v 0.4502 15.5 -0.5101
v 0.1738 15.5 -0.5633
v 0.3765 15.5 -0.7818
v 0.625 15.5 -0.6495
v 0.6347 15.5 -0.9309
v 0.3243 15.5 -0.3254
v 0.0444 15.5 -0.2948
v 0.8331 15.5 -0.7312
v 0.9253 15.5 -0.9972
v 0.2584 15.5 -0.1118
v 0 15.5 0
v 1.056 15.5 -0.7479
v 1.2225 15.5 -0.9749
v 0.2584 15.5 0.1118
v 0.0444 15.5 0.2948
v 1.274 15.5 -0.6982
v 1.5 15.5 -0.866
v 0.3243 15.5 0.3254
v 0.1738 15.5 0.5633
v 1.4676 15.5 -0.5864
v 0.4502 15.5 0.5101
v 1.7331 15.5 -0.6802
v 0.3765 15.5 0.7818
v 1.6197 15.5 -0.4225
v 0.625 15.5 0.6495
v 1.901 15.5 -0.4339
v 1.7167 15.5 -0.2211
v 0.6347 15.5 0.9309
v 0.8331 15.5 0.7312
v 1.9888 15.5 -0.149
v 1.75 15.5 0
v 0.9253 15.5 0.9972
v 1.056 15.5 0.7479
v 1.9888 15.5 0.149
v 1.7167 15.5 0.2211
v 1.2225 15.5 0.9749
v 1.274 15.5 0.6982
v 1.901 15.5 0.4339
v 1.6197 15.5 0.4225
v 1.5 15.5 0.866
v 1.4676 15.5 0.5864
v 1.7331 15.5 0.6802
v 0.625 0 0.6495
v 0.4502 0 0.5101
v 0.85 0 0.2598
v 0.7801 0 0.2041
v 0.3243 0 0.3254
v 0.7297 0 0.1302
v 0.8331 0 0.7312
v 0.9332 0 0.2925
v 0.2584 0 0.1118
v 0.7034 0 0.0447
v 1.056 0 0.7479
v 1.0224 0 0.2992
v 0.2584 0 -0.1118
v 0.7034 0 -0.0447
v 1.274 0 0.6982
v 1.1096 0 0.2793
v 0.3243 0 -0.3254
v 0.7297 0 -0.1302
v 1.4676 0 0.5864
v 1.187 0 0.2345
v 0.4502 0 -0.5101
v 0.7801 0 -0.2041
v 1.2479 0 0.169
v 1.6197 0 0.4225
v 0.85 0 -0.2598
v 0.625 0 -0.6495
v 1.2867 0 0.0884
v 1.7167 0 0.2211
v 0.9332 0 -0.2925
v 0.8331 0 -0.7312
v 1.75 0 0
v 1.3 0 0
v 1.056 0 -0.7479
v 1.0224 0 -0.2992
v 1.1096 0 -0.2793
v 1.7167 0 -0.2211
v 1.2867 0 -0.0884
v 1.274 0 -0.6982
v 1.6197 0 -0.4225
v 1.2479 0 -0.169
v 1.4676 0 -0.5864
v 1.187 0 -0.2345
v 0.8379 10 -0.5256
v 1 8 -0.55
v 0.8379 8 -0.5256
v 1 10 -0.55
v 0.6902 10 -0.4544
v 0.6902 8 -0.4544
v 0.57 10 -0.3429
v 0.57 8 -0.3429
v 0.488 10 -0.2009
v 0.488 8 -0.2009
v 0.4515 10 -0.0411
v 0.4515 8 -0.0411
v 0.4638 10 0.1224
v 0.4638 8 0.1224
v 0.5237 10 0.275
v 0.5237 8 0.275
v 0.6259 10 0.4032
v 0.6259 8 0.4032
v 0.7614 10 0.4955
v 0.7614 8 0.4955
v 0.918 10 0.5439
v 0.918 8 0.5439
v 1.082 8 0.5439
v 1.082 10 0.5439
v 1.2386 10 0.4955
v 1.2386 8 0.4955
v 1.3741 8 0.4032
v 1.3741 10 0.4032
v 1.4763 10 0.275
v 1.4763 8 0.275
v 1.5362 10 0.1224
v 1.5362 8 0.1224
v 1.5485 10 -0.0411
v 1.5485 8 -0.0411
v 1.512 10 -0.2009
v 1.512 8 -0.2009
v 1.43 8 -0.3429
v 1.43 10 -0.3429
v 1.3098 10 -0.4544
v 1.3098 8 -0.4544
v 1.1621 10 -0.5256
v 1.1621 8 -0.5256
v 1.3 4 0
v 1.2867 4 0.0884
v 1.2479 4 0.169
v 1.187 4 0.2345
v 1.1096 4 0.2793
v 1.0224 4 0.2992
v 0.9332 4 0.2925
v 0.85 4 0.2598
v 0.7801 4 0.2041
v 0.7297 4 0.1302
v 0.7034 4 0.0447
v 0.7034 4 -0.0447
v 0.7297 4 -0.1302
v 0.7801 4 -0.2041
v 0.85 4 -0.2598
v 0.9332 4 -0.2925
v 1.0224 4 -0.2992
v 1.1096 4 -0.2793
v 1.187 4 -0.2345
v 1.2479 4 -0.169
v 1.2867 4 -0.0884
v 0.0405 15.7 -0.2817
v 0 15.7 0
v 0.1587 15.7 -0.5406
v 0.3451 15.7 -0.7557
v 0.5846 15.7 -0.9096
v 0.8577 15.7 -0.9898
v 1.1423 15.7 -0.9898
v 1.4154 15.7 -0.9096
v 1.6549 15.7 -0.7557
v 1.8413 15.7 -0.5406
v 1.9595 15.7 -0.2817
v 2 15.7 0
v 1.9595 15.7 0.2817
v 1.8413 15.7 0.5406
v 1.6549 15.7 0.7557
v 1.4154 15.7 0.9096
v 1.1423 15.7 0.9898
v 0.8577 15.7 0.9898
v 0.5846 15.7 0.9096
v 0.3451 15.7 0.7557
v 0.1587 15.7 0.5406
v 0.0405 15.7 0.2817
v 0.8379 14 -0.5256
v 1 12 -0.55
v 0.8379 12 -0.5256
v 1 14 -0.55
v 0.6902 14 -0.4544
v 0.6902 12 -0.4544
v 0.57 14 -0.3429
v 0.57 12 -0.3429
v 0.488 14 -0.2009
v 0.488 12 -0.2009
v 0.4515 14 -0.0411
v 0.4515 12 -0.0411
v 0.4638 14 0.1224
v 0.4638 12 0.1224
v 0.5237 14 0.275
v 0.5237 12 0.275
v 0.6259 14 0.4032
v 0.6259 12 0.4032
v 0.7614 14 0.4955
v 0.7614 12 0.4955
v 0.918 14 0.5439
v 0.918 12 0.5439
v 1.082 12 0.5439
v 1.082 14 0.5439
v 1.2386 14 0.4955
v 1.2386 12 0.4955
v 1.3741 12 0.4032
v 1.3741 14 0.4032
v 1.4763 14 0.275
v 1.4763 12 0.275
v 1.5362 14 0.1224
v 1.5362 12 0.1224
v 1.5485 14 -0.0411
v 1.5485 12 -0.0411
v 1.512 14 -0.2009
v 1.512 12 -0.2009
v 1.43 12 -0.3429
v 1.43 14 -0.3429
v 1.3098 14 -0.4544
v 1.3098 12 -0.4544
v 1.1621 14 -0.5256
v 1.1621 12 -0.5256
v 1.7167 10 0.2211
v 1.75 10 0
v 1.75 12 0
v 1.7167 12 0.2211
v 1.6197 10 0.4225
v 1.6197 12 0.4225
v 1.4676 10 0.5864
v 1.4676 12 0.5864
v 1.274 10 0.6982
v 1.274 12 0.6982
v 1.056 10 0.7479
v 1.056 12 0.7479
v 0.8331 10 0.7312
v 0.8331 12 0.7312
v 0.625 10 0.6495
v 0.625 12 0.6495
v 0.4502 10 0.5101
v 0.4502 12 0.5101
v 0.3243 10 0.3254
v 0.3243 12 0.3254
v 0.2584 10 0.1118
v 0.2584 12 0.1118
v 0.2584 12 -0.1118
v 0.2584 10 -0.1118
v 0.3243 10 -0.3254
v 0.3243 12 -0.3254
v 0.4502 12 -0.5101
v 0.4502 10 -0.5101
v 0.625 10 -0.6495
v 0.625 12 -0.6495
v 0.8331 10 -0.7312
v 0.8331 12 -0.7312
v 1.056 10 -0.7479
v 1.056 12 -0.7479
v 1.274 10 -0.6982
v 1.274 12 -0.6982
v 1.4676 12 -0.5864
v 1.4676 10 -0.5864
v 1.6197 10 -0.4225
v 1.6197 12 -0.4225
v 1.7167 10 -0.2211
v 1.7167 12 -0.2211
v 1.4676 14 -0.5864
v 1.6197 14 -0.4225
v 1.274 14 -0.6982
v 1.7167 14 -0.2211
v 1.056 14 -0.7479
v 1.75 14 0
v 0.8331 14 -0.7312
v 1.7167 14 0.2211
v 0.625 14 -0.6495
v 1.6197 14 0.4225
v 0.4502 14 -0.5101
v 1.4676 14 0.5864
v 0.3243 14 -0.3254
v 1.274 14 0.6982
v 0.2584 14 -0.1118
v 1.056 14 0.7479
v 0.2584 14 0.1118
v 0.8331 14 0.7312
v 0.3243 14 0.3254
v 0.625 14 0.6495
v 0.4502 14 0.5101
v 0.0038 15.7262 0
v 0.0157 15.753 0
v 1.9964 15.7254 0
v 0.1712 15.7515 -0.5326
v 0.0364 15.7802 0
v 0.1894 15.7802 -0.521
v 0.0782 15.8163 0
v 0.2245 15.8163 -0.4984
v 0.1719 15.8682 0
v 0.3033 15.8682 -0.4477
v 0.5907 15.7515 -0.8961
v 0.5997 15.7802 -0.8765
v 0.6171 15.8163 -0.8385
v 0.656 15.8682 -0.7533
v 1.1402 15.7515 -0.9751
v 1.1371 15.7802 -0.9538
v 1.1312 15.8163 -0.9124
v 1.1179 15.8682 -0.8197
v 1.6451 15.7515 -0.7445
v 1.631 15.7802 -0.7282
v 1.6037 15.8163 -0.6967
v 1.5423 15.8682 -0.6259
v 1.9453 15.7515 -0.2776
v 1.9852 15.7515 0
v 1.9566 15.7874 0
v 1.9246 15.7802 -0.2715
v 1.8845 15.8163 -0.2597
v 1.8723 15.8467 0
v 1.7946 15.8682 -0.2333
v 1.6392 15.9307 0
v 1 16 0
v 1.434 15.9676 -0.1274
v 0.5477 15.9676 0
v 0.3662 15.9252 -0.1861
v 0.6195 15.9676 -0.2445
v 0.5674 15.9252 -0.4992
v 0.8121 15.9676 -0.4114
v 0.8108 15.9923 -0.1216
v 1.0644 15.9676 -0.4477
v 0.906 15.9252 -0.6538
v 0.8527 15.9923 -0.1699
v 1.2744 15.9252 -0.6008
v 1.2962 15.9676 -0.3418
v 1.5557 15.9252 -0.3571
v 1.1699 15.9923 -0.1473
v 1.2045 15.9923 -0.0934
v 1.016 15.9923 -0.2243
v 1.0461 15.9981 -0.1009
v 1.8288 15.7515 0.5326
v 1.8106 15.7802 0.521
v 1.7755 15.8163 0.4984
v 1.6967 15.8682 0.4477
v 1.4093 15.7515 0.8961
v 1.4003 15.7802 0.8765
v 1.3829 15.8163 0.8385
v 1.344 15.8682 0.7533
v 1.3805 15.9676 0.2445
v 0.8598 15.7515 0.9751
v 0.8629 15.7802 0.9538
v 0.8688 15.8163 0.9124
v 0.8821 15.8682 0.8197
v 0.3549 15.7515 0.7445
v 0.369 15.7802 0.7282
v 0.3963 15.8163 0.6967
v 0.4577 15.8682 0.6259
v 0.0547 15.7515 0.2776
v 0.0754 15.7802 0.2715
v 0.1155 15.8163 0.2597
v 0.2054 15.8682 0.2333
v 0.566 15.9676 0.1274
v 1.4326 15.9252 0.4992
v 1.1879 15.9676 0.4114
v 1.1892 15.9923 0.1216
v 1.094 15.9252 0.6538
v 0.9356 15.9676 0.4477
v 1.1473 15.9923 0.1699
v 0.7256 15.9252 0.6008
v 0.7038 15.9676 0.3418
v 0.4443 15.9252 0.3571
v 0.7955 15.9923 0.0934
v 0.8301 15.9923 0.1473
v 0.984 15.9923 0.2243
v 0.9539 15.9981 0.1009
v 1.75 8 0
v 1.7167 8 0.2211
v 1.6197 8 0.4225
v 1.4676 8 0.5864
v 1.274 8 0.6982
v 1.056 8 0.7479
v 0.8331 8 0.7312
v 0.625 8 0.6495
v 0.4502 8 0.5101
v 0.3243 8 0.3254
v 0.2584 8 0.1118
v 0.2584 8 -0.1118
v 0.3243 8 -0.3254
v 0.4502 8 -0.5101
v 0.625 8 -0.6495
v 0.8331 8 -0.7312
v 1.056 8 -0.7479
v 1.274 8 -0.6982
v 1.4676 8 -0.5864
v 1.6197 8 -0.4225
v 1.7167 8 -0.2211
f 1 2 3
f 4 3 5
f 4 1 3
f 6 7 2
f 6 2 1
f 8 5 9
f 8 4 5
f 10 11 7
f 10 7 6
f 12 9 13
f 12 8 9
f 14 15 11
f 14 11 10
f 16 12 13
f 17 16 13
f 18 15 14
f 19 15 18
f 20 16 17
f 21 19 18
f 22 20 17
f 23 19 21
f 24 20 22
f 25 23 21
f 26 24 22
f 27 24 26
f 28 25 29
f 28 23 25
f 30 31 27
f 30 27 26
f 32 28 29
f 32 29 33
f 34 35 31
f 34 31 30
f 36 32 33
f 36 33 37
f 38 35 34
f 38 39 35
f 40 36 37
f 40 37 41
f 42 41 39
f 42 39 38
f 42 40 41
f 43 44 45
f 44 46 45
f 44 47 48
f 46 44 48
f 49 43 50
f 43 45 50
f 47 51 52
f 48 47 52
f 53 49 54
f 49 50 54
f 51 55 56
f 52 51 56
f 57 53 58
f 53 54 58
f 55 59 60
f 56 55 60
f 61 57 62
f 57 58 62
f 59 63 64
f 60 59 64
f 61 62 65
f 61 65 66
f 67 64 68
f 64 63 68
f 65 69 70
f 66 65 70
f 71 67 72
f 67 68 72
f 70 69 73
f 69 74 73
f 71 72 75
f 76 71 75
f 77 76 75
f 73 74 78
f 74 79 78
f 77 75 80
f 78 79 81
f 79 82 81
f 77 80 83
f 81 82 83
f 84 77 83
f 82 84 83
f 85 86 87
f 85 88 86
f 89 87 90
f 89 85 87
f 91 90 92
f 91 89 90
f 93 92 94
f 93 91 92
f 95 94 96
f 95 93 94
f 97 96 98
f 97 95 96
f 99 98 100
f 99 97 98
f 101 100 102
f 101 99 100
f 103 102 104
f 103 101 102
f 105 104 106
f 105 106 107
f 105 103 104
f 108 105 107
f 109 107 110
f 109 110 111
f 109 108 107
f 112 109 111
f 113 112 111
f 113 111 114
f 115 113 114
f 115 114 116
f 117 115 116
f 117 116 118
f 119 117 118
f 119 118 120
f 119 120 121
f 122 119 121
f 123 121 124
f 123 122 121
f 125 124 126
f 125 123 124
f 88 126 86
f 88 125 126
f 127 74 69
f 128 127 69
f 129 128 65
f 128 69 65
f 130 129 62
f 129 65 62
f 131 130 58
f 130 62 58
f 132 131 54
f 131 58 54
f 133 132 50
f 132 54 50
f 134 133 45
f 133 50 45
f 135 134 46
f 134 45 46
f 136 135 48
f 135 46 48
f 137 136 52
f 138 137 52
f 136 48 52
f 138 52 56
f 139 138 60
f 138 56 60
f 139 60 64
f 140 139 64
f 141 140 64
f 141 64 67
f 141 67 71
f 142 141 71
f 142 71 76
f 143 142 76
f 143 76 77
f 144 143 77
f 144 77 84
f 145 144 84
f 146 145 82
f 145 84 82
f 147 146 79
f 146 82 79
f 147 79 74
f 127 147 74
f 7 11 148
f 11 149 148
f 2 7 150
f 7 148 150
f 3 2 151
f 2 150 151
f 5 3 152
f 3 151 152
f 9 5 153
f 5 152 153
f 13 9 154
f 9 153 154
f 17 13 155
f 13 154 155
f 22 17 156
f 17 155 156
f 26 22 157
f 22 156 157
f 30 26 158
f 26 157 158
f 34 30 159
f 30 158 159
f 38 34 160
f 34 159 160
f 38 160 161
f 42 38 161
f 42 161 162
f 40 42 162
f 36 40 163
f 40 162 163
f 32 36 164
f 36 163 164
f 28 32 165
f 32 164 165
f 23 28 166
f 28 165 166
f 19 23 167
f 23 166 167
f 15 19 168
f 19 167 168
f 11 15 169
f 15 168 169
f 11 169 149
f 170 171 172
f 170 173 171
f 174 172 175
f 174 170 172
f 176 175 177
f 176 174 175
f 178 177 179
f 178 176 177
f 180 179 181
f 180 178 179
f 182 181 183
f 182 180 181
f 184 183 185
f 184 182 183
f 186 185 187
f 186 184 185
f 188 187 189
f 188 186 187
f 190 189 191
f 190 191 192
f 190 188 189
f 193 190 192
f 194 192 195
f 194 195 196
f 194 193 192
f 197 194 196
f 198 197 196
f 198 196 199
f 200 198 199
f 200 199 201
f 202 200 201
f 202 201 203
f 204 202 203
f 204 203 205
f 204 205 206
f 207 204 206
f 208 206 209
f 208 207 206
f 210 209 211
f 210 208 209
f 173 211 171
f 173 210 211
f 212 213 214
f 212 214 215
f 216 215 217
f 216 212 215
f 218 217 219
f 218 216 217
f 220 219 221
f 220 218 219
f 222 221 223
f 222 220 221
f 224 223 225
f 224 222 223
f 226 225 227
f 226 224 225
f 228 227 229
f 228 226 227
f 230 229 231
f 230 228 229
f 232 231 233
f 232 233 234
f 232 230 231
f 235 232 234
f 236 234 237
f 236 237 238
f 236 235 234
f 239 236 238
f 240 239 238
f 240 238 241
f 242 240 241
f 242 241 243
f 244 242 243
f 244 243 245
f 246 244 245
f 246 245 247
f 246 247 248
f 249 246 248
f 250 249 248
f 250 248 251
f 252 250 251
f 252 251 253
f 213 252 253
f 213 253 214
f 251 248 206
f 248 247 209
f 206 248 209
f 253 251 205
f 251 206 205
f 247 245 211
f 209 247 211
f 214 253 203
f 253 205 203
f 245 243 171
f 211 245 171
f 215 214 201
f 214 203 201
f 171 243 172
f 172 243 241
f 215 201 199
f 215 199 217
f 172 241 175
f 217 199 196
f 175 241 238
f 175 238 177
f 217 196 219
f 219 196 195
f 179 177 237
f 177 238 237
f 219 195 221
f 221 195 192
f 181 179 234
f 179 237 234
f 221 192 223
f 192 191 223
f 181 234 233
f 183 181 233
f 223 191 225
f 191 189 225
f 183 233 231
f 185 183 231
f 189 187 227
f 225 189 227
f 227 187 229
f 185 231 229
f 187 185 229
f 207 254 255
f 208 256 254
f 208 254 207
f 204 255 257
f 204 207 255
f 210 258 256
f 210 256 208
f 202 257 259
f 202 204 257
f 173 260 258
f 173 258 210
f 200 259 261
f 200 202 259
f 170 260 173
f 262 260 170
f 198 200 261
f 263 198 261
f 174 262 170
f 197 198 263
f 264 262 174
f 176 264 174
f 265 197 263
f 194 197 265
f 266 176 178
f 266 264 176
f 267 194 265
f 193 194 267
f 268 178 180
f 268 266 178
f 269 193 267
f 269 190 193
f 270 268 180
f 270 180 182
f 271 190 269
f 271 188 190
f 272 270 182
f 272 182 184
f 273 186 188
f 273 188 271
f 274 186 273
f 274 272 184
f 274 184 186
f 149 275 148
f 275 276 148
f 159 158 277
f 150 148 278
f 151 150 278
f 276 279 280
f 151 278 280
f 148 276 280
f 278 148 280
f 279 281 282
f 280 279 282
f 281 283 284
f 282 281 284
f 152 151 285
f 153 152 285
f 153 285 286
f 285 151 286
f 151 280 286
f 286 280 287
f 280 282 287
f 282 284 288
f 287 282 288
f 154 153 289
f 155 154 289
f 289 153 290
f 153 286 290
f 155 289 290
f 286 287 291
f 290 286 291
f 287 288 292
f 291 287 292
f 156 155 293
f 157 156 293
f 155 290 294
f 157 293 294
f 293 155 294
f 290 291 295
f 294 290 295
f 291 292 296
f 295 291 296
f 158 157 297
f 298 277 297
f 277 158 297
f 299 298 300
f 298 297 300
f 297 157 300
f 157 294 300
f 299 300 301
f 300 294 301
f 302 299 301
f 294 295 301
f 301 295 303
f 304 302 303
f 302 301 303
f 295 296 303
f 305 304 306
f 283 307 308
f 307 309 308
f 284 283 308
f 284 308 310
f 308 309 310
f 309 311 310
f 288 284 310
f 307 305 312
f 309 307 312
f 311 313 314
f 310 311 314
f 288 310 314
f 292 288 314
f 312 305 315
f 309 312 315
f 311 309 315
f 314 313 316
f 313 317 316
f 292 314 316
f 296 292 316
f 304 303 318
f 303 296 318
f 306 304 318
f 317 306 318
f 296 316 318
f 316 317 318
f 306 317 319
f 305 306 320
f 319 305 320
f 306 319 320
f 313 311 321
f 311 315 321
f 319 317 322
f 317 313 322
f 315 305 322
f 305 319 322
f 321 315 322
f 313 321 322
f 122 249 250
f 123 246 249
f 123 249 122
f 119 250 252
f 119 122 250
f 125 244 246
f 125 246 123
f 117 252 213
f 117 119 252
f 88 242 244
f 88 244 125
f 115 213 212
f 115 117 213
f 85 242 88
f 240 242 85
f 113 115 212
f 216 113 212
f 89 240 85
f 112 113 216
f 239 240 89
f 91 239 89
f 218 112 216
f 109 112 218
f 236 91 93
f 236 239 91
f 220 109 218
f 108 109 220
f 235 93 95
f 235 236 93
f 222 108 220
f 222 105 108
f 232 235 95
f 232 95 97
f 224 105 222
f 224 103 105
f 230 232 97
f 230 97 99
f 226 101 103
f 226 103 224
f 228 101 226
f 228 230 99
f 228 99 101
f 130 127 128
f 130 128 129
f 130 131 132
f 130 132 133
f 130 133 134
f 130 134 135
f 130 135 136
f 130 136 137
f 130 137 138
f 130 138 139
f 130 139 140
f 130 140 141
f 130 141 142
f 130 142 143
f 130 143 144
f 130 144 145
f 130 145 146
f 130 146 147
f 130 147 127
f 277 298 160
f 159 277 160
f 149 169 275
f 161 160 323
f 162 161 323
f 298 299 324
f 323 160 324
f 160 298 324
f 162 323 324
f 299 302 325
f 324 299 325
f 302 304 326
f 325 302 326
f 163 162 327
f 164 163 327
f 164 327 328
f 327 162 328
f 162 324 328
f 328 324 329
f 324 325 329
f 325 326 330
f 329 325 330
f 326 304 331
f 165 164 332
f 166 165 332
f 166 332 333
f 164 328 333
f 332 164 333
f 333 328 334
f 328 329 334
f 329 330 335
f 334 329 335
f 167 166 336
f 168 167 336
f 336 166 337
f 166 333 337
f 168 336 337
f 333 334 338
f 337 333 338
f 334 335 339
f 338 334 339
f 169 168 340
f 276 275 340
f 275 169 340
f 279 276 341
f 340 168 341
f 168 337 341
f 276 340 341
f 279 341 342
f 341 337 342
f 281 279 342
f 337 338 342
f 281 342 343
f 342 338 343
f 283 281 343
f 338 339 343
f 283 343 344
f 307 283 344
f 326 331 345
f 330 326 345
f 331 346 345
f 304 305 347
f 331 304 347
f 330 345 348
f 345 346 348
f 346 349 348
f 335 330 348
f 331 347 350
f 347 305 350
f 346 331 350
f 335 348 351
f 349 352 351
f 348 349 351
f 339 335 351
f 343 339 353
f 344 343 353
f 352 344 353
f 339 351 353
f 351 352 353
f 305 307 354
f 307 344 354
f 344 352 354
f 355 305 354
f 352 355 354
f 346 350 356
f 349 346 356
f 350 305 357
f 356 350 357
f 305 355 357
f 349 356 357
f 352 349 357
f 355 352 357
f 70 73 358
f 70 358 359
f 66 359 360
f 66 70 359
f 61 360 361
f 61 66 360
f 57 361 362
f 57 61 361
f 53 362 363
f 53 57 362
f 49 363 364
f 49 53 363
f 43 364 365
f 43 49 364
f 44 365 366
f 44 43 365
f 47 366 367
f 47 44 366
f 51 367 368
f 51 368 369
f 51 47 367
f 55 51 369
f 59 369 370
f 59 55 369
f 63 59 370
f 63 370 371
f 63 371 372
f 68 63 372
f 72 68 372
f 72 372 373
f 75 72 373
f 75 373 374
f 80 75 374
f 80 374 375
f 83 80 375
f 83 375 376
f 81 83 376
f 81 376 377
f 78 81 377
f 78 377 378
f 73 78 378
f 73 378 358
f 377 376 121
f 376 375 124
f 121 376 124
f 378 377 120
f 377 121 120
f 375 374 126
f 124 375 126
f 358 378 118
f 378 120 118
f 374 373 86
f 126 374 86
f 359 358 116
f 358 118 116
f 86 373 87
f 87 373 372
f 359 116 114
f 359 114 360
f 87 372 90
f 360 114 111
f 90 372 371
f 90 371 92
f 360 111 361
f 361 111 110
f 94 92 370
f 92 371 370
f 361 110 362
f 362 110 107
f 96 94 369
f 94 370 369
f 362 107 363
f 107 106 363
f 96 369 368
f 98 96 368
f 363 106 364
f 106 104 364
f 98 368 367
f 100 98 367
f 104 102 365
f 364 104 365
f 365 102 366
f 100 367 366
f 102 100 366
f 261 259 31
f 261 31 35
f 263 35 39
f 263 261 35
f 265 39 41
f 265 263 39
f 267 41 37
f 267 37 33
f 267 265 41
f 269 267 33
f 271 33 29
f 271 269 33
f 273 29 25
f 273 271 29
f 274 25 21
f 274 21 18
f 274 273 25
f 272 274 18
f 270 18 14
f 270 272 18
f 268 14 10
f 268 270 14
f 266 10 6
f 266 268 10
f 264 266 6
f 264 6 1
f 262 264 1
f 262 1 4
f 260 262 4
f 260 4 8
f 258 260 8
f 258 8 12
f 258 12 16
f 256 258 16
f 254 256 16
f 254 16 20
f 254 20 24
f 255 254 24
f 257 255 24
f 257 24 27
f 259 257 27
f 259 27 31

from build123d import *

# Parameters (mm, degrees)
SKETCH_2_R          = 1.288183927
SKETCH_2_R_2        = 0.75
CUT_EXTRUDE_1_DEPTH = 15.5
SKETCH_3_R          = 0.3
CUT_EXTRUDE_2_DEPTH = 4
SKETCH_8_W          = 0.393463538
SKETCH_8_H          = 2


with BuildPart() as part:
    # 草图1 → 旋转1 (revolve)
    with BuildSketch(Plane.XY):
        with BuildLine():
            Line((1, 0), (2, 0))
            Line((2, 0), (2, 15.7))
            add(Edge.make_bspline(
                [(2, 15.7), (2, 16), (1, 16)],
                knots=[0, 0, 0, 1.570796327, 1.570796327, 1.570796327], degree=2, weights=[1, 0.707106781, 1]))
            Line((1, 16), (1, 0))
        make_face()
    revolve(axis=Axis((1, 22.010661338, 0), (0, -1, 0)))

    # 草图2 → 切除-拉伸1 (cut)
    with BuildSketch(Plane.XZ):
        with Locations((1, 0)):
            Circle(SKETCH_2_R)
        with Locations((1, 0)):
            Circle(SKETCH_2_R_2, mode=Mode.SUBTRACT)
    extrude(amount=-CUT_EXTRUDE_1_DEPTH, mode=Mode.SUBTRACT)

    # 草图3 → 切除-拉伸2 (cut)
    with BuildSketch(Plane(origin=(0, 0, 0), x_dir=(-1, 0, 0), z_dir=(0, -1, 0))):
        with Locations((-1, 0)):
            Circle(SKETCH_3_R)
    extrude(amount=-CUT_EXTRUDE_2_DEPTH, mode=Mode.SUBTRACT)

    # 草图8 → 切除-旋转1 (revolve, cut)
    with BuildSketch(Plane.XY):
        with Locations((1.746731769, 13)):
            Rectangle(SKETCH_8_W, SKETCH_8_H)
        with Locations((1.746731769, 9)):
            Rectangle(SKETCH_8_W, SKETCH_8_H)
    revolve(axis=Axis((1, 0, 0), (0, 1, 0)), mode=Mode.SUBTRACT)


solid = part.part
